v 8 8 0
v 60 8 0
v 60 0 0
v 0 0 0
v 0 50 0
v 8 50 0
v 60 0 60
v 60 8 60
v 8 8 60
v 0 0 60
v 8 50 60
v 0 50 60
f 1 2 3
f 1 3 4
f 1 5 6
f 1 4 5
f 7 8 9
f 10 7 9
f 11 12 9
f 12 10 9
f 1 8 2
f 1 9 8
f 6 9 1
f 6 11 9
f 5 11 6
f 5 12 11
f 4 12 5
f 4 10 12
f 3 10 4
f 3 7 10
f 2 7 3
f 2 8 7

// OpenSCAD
$fn = 32;

// ----------------------------------------------------------------------
// Structural section: angle 60 x 50 mm
// ----------------------------------------------------------------------

// --- parameters (mm) ---
sec_w = 60;               // leg width, X
sec_h = 50;               // leg height, Y
flange_t = 8;             // leg thickness
plate_t = 60;             // cut length, Z (extrusion height)

profile = [[0, 0], [60, 0], [60, 8], [8, 8], [8, 50], [0, 50]];  // primary outline, 6 points, counter clockwise

// --- the one profile operation ---
linear_extrude(height = plate_t) polygon(points = profile);
